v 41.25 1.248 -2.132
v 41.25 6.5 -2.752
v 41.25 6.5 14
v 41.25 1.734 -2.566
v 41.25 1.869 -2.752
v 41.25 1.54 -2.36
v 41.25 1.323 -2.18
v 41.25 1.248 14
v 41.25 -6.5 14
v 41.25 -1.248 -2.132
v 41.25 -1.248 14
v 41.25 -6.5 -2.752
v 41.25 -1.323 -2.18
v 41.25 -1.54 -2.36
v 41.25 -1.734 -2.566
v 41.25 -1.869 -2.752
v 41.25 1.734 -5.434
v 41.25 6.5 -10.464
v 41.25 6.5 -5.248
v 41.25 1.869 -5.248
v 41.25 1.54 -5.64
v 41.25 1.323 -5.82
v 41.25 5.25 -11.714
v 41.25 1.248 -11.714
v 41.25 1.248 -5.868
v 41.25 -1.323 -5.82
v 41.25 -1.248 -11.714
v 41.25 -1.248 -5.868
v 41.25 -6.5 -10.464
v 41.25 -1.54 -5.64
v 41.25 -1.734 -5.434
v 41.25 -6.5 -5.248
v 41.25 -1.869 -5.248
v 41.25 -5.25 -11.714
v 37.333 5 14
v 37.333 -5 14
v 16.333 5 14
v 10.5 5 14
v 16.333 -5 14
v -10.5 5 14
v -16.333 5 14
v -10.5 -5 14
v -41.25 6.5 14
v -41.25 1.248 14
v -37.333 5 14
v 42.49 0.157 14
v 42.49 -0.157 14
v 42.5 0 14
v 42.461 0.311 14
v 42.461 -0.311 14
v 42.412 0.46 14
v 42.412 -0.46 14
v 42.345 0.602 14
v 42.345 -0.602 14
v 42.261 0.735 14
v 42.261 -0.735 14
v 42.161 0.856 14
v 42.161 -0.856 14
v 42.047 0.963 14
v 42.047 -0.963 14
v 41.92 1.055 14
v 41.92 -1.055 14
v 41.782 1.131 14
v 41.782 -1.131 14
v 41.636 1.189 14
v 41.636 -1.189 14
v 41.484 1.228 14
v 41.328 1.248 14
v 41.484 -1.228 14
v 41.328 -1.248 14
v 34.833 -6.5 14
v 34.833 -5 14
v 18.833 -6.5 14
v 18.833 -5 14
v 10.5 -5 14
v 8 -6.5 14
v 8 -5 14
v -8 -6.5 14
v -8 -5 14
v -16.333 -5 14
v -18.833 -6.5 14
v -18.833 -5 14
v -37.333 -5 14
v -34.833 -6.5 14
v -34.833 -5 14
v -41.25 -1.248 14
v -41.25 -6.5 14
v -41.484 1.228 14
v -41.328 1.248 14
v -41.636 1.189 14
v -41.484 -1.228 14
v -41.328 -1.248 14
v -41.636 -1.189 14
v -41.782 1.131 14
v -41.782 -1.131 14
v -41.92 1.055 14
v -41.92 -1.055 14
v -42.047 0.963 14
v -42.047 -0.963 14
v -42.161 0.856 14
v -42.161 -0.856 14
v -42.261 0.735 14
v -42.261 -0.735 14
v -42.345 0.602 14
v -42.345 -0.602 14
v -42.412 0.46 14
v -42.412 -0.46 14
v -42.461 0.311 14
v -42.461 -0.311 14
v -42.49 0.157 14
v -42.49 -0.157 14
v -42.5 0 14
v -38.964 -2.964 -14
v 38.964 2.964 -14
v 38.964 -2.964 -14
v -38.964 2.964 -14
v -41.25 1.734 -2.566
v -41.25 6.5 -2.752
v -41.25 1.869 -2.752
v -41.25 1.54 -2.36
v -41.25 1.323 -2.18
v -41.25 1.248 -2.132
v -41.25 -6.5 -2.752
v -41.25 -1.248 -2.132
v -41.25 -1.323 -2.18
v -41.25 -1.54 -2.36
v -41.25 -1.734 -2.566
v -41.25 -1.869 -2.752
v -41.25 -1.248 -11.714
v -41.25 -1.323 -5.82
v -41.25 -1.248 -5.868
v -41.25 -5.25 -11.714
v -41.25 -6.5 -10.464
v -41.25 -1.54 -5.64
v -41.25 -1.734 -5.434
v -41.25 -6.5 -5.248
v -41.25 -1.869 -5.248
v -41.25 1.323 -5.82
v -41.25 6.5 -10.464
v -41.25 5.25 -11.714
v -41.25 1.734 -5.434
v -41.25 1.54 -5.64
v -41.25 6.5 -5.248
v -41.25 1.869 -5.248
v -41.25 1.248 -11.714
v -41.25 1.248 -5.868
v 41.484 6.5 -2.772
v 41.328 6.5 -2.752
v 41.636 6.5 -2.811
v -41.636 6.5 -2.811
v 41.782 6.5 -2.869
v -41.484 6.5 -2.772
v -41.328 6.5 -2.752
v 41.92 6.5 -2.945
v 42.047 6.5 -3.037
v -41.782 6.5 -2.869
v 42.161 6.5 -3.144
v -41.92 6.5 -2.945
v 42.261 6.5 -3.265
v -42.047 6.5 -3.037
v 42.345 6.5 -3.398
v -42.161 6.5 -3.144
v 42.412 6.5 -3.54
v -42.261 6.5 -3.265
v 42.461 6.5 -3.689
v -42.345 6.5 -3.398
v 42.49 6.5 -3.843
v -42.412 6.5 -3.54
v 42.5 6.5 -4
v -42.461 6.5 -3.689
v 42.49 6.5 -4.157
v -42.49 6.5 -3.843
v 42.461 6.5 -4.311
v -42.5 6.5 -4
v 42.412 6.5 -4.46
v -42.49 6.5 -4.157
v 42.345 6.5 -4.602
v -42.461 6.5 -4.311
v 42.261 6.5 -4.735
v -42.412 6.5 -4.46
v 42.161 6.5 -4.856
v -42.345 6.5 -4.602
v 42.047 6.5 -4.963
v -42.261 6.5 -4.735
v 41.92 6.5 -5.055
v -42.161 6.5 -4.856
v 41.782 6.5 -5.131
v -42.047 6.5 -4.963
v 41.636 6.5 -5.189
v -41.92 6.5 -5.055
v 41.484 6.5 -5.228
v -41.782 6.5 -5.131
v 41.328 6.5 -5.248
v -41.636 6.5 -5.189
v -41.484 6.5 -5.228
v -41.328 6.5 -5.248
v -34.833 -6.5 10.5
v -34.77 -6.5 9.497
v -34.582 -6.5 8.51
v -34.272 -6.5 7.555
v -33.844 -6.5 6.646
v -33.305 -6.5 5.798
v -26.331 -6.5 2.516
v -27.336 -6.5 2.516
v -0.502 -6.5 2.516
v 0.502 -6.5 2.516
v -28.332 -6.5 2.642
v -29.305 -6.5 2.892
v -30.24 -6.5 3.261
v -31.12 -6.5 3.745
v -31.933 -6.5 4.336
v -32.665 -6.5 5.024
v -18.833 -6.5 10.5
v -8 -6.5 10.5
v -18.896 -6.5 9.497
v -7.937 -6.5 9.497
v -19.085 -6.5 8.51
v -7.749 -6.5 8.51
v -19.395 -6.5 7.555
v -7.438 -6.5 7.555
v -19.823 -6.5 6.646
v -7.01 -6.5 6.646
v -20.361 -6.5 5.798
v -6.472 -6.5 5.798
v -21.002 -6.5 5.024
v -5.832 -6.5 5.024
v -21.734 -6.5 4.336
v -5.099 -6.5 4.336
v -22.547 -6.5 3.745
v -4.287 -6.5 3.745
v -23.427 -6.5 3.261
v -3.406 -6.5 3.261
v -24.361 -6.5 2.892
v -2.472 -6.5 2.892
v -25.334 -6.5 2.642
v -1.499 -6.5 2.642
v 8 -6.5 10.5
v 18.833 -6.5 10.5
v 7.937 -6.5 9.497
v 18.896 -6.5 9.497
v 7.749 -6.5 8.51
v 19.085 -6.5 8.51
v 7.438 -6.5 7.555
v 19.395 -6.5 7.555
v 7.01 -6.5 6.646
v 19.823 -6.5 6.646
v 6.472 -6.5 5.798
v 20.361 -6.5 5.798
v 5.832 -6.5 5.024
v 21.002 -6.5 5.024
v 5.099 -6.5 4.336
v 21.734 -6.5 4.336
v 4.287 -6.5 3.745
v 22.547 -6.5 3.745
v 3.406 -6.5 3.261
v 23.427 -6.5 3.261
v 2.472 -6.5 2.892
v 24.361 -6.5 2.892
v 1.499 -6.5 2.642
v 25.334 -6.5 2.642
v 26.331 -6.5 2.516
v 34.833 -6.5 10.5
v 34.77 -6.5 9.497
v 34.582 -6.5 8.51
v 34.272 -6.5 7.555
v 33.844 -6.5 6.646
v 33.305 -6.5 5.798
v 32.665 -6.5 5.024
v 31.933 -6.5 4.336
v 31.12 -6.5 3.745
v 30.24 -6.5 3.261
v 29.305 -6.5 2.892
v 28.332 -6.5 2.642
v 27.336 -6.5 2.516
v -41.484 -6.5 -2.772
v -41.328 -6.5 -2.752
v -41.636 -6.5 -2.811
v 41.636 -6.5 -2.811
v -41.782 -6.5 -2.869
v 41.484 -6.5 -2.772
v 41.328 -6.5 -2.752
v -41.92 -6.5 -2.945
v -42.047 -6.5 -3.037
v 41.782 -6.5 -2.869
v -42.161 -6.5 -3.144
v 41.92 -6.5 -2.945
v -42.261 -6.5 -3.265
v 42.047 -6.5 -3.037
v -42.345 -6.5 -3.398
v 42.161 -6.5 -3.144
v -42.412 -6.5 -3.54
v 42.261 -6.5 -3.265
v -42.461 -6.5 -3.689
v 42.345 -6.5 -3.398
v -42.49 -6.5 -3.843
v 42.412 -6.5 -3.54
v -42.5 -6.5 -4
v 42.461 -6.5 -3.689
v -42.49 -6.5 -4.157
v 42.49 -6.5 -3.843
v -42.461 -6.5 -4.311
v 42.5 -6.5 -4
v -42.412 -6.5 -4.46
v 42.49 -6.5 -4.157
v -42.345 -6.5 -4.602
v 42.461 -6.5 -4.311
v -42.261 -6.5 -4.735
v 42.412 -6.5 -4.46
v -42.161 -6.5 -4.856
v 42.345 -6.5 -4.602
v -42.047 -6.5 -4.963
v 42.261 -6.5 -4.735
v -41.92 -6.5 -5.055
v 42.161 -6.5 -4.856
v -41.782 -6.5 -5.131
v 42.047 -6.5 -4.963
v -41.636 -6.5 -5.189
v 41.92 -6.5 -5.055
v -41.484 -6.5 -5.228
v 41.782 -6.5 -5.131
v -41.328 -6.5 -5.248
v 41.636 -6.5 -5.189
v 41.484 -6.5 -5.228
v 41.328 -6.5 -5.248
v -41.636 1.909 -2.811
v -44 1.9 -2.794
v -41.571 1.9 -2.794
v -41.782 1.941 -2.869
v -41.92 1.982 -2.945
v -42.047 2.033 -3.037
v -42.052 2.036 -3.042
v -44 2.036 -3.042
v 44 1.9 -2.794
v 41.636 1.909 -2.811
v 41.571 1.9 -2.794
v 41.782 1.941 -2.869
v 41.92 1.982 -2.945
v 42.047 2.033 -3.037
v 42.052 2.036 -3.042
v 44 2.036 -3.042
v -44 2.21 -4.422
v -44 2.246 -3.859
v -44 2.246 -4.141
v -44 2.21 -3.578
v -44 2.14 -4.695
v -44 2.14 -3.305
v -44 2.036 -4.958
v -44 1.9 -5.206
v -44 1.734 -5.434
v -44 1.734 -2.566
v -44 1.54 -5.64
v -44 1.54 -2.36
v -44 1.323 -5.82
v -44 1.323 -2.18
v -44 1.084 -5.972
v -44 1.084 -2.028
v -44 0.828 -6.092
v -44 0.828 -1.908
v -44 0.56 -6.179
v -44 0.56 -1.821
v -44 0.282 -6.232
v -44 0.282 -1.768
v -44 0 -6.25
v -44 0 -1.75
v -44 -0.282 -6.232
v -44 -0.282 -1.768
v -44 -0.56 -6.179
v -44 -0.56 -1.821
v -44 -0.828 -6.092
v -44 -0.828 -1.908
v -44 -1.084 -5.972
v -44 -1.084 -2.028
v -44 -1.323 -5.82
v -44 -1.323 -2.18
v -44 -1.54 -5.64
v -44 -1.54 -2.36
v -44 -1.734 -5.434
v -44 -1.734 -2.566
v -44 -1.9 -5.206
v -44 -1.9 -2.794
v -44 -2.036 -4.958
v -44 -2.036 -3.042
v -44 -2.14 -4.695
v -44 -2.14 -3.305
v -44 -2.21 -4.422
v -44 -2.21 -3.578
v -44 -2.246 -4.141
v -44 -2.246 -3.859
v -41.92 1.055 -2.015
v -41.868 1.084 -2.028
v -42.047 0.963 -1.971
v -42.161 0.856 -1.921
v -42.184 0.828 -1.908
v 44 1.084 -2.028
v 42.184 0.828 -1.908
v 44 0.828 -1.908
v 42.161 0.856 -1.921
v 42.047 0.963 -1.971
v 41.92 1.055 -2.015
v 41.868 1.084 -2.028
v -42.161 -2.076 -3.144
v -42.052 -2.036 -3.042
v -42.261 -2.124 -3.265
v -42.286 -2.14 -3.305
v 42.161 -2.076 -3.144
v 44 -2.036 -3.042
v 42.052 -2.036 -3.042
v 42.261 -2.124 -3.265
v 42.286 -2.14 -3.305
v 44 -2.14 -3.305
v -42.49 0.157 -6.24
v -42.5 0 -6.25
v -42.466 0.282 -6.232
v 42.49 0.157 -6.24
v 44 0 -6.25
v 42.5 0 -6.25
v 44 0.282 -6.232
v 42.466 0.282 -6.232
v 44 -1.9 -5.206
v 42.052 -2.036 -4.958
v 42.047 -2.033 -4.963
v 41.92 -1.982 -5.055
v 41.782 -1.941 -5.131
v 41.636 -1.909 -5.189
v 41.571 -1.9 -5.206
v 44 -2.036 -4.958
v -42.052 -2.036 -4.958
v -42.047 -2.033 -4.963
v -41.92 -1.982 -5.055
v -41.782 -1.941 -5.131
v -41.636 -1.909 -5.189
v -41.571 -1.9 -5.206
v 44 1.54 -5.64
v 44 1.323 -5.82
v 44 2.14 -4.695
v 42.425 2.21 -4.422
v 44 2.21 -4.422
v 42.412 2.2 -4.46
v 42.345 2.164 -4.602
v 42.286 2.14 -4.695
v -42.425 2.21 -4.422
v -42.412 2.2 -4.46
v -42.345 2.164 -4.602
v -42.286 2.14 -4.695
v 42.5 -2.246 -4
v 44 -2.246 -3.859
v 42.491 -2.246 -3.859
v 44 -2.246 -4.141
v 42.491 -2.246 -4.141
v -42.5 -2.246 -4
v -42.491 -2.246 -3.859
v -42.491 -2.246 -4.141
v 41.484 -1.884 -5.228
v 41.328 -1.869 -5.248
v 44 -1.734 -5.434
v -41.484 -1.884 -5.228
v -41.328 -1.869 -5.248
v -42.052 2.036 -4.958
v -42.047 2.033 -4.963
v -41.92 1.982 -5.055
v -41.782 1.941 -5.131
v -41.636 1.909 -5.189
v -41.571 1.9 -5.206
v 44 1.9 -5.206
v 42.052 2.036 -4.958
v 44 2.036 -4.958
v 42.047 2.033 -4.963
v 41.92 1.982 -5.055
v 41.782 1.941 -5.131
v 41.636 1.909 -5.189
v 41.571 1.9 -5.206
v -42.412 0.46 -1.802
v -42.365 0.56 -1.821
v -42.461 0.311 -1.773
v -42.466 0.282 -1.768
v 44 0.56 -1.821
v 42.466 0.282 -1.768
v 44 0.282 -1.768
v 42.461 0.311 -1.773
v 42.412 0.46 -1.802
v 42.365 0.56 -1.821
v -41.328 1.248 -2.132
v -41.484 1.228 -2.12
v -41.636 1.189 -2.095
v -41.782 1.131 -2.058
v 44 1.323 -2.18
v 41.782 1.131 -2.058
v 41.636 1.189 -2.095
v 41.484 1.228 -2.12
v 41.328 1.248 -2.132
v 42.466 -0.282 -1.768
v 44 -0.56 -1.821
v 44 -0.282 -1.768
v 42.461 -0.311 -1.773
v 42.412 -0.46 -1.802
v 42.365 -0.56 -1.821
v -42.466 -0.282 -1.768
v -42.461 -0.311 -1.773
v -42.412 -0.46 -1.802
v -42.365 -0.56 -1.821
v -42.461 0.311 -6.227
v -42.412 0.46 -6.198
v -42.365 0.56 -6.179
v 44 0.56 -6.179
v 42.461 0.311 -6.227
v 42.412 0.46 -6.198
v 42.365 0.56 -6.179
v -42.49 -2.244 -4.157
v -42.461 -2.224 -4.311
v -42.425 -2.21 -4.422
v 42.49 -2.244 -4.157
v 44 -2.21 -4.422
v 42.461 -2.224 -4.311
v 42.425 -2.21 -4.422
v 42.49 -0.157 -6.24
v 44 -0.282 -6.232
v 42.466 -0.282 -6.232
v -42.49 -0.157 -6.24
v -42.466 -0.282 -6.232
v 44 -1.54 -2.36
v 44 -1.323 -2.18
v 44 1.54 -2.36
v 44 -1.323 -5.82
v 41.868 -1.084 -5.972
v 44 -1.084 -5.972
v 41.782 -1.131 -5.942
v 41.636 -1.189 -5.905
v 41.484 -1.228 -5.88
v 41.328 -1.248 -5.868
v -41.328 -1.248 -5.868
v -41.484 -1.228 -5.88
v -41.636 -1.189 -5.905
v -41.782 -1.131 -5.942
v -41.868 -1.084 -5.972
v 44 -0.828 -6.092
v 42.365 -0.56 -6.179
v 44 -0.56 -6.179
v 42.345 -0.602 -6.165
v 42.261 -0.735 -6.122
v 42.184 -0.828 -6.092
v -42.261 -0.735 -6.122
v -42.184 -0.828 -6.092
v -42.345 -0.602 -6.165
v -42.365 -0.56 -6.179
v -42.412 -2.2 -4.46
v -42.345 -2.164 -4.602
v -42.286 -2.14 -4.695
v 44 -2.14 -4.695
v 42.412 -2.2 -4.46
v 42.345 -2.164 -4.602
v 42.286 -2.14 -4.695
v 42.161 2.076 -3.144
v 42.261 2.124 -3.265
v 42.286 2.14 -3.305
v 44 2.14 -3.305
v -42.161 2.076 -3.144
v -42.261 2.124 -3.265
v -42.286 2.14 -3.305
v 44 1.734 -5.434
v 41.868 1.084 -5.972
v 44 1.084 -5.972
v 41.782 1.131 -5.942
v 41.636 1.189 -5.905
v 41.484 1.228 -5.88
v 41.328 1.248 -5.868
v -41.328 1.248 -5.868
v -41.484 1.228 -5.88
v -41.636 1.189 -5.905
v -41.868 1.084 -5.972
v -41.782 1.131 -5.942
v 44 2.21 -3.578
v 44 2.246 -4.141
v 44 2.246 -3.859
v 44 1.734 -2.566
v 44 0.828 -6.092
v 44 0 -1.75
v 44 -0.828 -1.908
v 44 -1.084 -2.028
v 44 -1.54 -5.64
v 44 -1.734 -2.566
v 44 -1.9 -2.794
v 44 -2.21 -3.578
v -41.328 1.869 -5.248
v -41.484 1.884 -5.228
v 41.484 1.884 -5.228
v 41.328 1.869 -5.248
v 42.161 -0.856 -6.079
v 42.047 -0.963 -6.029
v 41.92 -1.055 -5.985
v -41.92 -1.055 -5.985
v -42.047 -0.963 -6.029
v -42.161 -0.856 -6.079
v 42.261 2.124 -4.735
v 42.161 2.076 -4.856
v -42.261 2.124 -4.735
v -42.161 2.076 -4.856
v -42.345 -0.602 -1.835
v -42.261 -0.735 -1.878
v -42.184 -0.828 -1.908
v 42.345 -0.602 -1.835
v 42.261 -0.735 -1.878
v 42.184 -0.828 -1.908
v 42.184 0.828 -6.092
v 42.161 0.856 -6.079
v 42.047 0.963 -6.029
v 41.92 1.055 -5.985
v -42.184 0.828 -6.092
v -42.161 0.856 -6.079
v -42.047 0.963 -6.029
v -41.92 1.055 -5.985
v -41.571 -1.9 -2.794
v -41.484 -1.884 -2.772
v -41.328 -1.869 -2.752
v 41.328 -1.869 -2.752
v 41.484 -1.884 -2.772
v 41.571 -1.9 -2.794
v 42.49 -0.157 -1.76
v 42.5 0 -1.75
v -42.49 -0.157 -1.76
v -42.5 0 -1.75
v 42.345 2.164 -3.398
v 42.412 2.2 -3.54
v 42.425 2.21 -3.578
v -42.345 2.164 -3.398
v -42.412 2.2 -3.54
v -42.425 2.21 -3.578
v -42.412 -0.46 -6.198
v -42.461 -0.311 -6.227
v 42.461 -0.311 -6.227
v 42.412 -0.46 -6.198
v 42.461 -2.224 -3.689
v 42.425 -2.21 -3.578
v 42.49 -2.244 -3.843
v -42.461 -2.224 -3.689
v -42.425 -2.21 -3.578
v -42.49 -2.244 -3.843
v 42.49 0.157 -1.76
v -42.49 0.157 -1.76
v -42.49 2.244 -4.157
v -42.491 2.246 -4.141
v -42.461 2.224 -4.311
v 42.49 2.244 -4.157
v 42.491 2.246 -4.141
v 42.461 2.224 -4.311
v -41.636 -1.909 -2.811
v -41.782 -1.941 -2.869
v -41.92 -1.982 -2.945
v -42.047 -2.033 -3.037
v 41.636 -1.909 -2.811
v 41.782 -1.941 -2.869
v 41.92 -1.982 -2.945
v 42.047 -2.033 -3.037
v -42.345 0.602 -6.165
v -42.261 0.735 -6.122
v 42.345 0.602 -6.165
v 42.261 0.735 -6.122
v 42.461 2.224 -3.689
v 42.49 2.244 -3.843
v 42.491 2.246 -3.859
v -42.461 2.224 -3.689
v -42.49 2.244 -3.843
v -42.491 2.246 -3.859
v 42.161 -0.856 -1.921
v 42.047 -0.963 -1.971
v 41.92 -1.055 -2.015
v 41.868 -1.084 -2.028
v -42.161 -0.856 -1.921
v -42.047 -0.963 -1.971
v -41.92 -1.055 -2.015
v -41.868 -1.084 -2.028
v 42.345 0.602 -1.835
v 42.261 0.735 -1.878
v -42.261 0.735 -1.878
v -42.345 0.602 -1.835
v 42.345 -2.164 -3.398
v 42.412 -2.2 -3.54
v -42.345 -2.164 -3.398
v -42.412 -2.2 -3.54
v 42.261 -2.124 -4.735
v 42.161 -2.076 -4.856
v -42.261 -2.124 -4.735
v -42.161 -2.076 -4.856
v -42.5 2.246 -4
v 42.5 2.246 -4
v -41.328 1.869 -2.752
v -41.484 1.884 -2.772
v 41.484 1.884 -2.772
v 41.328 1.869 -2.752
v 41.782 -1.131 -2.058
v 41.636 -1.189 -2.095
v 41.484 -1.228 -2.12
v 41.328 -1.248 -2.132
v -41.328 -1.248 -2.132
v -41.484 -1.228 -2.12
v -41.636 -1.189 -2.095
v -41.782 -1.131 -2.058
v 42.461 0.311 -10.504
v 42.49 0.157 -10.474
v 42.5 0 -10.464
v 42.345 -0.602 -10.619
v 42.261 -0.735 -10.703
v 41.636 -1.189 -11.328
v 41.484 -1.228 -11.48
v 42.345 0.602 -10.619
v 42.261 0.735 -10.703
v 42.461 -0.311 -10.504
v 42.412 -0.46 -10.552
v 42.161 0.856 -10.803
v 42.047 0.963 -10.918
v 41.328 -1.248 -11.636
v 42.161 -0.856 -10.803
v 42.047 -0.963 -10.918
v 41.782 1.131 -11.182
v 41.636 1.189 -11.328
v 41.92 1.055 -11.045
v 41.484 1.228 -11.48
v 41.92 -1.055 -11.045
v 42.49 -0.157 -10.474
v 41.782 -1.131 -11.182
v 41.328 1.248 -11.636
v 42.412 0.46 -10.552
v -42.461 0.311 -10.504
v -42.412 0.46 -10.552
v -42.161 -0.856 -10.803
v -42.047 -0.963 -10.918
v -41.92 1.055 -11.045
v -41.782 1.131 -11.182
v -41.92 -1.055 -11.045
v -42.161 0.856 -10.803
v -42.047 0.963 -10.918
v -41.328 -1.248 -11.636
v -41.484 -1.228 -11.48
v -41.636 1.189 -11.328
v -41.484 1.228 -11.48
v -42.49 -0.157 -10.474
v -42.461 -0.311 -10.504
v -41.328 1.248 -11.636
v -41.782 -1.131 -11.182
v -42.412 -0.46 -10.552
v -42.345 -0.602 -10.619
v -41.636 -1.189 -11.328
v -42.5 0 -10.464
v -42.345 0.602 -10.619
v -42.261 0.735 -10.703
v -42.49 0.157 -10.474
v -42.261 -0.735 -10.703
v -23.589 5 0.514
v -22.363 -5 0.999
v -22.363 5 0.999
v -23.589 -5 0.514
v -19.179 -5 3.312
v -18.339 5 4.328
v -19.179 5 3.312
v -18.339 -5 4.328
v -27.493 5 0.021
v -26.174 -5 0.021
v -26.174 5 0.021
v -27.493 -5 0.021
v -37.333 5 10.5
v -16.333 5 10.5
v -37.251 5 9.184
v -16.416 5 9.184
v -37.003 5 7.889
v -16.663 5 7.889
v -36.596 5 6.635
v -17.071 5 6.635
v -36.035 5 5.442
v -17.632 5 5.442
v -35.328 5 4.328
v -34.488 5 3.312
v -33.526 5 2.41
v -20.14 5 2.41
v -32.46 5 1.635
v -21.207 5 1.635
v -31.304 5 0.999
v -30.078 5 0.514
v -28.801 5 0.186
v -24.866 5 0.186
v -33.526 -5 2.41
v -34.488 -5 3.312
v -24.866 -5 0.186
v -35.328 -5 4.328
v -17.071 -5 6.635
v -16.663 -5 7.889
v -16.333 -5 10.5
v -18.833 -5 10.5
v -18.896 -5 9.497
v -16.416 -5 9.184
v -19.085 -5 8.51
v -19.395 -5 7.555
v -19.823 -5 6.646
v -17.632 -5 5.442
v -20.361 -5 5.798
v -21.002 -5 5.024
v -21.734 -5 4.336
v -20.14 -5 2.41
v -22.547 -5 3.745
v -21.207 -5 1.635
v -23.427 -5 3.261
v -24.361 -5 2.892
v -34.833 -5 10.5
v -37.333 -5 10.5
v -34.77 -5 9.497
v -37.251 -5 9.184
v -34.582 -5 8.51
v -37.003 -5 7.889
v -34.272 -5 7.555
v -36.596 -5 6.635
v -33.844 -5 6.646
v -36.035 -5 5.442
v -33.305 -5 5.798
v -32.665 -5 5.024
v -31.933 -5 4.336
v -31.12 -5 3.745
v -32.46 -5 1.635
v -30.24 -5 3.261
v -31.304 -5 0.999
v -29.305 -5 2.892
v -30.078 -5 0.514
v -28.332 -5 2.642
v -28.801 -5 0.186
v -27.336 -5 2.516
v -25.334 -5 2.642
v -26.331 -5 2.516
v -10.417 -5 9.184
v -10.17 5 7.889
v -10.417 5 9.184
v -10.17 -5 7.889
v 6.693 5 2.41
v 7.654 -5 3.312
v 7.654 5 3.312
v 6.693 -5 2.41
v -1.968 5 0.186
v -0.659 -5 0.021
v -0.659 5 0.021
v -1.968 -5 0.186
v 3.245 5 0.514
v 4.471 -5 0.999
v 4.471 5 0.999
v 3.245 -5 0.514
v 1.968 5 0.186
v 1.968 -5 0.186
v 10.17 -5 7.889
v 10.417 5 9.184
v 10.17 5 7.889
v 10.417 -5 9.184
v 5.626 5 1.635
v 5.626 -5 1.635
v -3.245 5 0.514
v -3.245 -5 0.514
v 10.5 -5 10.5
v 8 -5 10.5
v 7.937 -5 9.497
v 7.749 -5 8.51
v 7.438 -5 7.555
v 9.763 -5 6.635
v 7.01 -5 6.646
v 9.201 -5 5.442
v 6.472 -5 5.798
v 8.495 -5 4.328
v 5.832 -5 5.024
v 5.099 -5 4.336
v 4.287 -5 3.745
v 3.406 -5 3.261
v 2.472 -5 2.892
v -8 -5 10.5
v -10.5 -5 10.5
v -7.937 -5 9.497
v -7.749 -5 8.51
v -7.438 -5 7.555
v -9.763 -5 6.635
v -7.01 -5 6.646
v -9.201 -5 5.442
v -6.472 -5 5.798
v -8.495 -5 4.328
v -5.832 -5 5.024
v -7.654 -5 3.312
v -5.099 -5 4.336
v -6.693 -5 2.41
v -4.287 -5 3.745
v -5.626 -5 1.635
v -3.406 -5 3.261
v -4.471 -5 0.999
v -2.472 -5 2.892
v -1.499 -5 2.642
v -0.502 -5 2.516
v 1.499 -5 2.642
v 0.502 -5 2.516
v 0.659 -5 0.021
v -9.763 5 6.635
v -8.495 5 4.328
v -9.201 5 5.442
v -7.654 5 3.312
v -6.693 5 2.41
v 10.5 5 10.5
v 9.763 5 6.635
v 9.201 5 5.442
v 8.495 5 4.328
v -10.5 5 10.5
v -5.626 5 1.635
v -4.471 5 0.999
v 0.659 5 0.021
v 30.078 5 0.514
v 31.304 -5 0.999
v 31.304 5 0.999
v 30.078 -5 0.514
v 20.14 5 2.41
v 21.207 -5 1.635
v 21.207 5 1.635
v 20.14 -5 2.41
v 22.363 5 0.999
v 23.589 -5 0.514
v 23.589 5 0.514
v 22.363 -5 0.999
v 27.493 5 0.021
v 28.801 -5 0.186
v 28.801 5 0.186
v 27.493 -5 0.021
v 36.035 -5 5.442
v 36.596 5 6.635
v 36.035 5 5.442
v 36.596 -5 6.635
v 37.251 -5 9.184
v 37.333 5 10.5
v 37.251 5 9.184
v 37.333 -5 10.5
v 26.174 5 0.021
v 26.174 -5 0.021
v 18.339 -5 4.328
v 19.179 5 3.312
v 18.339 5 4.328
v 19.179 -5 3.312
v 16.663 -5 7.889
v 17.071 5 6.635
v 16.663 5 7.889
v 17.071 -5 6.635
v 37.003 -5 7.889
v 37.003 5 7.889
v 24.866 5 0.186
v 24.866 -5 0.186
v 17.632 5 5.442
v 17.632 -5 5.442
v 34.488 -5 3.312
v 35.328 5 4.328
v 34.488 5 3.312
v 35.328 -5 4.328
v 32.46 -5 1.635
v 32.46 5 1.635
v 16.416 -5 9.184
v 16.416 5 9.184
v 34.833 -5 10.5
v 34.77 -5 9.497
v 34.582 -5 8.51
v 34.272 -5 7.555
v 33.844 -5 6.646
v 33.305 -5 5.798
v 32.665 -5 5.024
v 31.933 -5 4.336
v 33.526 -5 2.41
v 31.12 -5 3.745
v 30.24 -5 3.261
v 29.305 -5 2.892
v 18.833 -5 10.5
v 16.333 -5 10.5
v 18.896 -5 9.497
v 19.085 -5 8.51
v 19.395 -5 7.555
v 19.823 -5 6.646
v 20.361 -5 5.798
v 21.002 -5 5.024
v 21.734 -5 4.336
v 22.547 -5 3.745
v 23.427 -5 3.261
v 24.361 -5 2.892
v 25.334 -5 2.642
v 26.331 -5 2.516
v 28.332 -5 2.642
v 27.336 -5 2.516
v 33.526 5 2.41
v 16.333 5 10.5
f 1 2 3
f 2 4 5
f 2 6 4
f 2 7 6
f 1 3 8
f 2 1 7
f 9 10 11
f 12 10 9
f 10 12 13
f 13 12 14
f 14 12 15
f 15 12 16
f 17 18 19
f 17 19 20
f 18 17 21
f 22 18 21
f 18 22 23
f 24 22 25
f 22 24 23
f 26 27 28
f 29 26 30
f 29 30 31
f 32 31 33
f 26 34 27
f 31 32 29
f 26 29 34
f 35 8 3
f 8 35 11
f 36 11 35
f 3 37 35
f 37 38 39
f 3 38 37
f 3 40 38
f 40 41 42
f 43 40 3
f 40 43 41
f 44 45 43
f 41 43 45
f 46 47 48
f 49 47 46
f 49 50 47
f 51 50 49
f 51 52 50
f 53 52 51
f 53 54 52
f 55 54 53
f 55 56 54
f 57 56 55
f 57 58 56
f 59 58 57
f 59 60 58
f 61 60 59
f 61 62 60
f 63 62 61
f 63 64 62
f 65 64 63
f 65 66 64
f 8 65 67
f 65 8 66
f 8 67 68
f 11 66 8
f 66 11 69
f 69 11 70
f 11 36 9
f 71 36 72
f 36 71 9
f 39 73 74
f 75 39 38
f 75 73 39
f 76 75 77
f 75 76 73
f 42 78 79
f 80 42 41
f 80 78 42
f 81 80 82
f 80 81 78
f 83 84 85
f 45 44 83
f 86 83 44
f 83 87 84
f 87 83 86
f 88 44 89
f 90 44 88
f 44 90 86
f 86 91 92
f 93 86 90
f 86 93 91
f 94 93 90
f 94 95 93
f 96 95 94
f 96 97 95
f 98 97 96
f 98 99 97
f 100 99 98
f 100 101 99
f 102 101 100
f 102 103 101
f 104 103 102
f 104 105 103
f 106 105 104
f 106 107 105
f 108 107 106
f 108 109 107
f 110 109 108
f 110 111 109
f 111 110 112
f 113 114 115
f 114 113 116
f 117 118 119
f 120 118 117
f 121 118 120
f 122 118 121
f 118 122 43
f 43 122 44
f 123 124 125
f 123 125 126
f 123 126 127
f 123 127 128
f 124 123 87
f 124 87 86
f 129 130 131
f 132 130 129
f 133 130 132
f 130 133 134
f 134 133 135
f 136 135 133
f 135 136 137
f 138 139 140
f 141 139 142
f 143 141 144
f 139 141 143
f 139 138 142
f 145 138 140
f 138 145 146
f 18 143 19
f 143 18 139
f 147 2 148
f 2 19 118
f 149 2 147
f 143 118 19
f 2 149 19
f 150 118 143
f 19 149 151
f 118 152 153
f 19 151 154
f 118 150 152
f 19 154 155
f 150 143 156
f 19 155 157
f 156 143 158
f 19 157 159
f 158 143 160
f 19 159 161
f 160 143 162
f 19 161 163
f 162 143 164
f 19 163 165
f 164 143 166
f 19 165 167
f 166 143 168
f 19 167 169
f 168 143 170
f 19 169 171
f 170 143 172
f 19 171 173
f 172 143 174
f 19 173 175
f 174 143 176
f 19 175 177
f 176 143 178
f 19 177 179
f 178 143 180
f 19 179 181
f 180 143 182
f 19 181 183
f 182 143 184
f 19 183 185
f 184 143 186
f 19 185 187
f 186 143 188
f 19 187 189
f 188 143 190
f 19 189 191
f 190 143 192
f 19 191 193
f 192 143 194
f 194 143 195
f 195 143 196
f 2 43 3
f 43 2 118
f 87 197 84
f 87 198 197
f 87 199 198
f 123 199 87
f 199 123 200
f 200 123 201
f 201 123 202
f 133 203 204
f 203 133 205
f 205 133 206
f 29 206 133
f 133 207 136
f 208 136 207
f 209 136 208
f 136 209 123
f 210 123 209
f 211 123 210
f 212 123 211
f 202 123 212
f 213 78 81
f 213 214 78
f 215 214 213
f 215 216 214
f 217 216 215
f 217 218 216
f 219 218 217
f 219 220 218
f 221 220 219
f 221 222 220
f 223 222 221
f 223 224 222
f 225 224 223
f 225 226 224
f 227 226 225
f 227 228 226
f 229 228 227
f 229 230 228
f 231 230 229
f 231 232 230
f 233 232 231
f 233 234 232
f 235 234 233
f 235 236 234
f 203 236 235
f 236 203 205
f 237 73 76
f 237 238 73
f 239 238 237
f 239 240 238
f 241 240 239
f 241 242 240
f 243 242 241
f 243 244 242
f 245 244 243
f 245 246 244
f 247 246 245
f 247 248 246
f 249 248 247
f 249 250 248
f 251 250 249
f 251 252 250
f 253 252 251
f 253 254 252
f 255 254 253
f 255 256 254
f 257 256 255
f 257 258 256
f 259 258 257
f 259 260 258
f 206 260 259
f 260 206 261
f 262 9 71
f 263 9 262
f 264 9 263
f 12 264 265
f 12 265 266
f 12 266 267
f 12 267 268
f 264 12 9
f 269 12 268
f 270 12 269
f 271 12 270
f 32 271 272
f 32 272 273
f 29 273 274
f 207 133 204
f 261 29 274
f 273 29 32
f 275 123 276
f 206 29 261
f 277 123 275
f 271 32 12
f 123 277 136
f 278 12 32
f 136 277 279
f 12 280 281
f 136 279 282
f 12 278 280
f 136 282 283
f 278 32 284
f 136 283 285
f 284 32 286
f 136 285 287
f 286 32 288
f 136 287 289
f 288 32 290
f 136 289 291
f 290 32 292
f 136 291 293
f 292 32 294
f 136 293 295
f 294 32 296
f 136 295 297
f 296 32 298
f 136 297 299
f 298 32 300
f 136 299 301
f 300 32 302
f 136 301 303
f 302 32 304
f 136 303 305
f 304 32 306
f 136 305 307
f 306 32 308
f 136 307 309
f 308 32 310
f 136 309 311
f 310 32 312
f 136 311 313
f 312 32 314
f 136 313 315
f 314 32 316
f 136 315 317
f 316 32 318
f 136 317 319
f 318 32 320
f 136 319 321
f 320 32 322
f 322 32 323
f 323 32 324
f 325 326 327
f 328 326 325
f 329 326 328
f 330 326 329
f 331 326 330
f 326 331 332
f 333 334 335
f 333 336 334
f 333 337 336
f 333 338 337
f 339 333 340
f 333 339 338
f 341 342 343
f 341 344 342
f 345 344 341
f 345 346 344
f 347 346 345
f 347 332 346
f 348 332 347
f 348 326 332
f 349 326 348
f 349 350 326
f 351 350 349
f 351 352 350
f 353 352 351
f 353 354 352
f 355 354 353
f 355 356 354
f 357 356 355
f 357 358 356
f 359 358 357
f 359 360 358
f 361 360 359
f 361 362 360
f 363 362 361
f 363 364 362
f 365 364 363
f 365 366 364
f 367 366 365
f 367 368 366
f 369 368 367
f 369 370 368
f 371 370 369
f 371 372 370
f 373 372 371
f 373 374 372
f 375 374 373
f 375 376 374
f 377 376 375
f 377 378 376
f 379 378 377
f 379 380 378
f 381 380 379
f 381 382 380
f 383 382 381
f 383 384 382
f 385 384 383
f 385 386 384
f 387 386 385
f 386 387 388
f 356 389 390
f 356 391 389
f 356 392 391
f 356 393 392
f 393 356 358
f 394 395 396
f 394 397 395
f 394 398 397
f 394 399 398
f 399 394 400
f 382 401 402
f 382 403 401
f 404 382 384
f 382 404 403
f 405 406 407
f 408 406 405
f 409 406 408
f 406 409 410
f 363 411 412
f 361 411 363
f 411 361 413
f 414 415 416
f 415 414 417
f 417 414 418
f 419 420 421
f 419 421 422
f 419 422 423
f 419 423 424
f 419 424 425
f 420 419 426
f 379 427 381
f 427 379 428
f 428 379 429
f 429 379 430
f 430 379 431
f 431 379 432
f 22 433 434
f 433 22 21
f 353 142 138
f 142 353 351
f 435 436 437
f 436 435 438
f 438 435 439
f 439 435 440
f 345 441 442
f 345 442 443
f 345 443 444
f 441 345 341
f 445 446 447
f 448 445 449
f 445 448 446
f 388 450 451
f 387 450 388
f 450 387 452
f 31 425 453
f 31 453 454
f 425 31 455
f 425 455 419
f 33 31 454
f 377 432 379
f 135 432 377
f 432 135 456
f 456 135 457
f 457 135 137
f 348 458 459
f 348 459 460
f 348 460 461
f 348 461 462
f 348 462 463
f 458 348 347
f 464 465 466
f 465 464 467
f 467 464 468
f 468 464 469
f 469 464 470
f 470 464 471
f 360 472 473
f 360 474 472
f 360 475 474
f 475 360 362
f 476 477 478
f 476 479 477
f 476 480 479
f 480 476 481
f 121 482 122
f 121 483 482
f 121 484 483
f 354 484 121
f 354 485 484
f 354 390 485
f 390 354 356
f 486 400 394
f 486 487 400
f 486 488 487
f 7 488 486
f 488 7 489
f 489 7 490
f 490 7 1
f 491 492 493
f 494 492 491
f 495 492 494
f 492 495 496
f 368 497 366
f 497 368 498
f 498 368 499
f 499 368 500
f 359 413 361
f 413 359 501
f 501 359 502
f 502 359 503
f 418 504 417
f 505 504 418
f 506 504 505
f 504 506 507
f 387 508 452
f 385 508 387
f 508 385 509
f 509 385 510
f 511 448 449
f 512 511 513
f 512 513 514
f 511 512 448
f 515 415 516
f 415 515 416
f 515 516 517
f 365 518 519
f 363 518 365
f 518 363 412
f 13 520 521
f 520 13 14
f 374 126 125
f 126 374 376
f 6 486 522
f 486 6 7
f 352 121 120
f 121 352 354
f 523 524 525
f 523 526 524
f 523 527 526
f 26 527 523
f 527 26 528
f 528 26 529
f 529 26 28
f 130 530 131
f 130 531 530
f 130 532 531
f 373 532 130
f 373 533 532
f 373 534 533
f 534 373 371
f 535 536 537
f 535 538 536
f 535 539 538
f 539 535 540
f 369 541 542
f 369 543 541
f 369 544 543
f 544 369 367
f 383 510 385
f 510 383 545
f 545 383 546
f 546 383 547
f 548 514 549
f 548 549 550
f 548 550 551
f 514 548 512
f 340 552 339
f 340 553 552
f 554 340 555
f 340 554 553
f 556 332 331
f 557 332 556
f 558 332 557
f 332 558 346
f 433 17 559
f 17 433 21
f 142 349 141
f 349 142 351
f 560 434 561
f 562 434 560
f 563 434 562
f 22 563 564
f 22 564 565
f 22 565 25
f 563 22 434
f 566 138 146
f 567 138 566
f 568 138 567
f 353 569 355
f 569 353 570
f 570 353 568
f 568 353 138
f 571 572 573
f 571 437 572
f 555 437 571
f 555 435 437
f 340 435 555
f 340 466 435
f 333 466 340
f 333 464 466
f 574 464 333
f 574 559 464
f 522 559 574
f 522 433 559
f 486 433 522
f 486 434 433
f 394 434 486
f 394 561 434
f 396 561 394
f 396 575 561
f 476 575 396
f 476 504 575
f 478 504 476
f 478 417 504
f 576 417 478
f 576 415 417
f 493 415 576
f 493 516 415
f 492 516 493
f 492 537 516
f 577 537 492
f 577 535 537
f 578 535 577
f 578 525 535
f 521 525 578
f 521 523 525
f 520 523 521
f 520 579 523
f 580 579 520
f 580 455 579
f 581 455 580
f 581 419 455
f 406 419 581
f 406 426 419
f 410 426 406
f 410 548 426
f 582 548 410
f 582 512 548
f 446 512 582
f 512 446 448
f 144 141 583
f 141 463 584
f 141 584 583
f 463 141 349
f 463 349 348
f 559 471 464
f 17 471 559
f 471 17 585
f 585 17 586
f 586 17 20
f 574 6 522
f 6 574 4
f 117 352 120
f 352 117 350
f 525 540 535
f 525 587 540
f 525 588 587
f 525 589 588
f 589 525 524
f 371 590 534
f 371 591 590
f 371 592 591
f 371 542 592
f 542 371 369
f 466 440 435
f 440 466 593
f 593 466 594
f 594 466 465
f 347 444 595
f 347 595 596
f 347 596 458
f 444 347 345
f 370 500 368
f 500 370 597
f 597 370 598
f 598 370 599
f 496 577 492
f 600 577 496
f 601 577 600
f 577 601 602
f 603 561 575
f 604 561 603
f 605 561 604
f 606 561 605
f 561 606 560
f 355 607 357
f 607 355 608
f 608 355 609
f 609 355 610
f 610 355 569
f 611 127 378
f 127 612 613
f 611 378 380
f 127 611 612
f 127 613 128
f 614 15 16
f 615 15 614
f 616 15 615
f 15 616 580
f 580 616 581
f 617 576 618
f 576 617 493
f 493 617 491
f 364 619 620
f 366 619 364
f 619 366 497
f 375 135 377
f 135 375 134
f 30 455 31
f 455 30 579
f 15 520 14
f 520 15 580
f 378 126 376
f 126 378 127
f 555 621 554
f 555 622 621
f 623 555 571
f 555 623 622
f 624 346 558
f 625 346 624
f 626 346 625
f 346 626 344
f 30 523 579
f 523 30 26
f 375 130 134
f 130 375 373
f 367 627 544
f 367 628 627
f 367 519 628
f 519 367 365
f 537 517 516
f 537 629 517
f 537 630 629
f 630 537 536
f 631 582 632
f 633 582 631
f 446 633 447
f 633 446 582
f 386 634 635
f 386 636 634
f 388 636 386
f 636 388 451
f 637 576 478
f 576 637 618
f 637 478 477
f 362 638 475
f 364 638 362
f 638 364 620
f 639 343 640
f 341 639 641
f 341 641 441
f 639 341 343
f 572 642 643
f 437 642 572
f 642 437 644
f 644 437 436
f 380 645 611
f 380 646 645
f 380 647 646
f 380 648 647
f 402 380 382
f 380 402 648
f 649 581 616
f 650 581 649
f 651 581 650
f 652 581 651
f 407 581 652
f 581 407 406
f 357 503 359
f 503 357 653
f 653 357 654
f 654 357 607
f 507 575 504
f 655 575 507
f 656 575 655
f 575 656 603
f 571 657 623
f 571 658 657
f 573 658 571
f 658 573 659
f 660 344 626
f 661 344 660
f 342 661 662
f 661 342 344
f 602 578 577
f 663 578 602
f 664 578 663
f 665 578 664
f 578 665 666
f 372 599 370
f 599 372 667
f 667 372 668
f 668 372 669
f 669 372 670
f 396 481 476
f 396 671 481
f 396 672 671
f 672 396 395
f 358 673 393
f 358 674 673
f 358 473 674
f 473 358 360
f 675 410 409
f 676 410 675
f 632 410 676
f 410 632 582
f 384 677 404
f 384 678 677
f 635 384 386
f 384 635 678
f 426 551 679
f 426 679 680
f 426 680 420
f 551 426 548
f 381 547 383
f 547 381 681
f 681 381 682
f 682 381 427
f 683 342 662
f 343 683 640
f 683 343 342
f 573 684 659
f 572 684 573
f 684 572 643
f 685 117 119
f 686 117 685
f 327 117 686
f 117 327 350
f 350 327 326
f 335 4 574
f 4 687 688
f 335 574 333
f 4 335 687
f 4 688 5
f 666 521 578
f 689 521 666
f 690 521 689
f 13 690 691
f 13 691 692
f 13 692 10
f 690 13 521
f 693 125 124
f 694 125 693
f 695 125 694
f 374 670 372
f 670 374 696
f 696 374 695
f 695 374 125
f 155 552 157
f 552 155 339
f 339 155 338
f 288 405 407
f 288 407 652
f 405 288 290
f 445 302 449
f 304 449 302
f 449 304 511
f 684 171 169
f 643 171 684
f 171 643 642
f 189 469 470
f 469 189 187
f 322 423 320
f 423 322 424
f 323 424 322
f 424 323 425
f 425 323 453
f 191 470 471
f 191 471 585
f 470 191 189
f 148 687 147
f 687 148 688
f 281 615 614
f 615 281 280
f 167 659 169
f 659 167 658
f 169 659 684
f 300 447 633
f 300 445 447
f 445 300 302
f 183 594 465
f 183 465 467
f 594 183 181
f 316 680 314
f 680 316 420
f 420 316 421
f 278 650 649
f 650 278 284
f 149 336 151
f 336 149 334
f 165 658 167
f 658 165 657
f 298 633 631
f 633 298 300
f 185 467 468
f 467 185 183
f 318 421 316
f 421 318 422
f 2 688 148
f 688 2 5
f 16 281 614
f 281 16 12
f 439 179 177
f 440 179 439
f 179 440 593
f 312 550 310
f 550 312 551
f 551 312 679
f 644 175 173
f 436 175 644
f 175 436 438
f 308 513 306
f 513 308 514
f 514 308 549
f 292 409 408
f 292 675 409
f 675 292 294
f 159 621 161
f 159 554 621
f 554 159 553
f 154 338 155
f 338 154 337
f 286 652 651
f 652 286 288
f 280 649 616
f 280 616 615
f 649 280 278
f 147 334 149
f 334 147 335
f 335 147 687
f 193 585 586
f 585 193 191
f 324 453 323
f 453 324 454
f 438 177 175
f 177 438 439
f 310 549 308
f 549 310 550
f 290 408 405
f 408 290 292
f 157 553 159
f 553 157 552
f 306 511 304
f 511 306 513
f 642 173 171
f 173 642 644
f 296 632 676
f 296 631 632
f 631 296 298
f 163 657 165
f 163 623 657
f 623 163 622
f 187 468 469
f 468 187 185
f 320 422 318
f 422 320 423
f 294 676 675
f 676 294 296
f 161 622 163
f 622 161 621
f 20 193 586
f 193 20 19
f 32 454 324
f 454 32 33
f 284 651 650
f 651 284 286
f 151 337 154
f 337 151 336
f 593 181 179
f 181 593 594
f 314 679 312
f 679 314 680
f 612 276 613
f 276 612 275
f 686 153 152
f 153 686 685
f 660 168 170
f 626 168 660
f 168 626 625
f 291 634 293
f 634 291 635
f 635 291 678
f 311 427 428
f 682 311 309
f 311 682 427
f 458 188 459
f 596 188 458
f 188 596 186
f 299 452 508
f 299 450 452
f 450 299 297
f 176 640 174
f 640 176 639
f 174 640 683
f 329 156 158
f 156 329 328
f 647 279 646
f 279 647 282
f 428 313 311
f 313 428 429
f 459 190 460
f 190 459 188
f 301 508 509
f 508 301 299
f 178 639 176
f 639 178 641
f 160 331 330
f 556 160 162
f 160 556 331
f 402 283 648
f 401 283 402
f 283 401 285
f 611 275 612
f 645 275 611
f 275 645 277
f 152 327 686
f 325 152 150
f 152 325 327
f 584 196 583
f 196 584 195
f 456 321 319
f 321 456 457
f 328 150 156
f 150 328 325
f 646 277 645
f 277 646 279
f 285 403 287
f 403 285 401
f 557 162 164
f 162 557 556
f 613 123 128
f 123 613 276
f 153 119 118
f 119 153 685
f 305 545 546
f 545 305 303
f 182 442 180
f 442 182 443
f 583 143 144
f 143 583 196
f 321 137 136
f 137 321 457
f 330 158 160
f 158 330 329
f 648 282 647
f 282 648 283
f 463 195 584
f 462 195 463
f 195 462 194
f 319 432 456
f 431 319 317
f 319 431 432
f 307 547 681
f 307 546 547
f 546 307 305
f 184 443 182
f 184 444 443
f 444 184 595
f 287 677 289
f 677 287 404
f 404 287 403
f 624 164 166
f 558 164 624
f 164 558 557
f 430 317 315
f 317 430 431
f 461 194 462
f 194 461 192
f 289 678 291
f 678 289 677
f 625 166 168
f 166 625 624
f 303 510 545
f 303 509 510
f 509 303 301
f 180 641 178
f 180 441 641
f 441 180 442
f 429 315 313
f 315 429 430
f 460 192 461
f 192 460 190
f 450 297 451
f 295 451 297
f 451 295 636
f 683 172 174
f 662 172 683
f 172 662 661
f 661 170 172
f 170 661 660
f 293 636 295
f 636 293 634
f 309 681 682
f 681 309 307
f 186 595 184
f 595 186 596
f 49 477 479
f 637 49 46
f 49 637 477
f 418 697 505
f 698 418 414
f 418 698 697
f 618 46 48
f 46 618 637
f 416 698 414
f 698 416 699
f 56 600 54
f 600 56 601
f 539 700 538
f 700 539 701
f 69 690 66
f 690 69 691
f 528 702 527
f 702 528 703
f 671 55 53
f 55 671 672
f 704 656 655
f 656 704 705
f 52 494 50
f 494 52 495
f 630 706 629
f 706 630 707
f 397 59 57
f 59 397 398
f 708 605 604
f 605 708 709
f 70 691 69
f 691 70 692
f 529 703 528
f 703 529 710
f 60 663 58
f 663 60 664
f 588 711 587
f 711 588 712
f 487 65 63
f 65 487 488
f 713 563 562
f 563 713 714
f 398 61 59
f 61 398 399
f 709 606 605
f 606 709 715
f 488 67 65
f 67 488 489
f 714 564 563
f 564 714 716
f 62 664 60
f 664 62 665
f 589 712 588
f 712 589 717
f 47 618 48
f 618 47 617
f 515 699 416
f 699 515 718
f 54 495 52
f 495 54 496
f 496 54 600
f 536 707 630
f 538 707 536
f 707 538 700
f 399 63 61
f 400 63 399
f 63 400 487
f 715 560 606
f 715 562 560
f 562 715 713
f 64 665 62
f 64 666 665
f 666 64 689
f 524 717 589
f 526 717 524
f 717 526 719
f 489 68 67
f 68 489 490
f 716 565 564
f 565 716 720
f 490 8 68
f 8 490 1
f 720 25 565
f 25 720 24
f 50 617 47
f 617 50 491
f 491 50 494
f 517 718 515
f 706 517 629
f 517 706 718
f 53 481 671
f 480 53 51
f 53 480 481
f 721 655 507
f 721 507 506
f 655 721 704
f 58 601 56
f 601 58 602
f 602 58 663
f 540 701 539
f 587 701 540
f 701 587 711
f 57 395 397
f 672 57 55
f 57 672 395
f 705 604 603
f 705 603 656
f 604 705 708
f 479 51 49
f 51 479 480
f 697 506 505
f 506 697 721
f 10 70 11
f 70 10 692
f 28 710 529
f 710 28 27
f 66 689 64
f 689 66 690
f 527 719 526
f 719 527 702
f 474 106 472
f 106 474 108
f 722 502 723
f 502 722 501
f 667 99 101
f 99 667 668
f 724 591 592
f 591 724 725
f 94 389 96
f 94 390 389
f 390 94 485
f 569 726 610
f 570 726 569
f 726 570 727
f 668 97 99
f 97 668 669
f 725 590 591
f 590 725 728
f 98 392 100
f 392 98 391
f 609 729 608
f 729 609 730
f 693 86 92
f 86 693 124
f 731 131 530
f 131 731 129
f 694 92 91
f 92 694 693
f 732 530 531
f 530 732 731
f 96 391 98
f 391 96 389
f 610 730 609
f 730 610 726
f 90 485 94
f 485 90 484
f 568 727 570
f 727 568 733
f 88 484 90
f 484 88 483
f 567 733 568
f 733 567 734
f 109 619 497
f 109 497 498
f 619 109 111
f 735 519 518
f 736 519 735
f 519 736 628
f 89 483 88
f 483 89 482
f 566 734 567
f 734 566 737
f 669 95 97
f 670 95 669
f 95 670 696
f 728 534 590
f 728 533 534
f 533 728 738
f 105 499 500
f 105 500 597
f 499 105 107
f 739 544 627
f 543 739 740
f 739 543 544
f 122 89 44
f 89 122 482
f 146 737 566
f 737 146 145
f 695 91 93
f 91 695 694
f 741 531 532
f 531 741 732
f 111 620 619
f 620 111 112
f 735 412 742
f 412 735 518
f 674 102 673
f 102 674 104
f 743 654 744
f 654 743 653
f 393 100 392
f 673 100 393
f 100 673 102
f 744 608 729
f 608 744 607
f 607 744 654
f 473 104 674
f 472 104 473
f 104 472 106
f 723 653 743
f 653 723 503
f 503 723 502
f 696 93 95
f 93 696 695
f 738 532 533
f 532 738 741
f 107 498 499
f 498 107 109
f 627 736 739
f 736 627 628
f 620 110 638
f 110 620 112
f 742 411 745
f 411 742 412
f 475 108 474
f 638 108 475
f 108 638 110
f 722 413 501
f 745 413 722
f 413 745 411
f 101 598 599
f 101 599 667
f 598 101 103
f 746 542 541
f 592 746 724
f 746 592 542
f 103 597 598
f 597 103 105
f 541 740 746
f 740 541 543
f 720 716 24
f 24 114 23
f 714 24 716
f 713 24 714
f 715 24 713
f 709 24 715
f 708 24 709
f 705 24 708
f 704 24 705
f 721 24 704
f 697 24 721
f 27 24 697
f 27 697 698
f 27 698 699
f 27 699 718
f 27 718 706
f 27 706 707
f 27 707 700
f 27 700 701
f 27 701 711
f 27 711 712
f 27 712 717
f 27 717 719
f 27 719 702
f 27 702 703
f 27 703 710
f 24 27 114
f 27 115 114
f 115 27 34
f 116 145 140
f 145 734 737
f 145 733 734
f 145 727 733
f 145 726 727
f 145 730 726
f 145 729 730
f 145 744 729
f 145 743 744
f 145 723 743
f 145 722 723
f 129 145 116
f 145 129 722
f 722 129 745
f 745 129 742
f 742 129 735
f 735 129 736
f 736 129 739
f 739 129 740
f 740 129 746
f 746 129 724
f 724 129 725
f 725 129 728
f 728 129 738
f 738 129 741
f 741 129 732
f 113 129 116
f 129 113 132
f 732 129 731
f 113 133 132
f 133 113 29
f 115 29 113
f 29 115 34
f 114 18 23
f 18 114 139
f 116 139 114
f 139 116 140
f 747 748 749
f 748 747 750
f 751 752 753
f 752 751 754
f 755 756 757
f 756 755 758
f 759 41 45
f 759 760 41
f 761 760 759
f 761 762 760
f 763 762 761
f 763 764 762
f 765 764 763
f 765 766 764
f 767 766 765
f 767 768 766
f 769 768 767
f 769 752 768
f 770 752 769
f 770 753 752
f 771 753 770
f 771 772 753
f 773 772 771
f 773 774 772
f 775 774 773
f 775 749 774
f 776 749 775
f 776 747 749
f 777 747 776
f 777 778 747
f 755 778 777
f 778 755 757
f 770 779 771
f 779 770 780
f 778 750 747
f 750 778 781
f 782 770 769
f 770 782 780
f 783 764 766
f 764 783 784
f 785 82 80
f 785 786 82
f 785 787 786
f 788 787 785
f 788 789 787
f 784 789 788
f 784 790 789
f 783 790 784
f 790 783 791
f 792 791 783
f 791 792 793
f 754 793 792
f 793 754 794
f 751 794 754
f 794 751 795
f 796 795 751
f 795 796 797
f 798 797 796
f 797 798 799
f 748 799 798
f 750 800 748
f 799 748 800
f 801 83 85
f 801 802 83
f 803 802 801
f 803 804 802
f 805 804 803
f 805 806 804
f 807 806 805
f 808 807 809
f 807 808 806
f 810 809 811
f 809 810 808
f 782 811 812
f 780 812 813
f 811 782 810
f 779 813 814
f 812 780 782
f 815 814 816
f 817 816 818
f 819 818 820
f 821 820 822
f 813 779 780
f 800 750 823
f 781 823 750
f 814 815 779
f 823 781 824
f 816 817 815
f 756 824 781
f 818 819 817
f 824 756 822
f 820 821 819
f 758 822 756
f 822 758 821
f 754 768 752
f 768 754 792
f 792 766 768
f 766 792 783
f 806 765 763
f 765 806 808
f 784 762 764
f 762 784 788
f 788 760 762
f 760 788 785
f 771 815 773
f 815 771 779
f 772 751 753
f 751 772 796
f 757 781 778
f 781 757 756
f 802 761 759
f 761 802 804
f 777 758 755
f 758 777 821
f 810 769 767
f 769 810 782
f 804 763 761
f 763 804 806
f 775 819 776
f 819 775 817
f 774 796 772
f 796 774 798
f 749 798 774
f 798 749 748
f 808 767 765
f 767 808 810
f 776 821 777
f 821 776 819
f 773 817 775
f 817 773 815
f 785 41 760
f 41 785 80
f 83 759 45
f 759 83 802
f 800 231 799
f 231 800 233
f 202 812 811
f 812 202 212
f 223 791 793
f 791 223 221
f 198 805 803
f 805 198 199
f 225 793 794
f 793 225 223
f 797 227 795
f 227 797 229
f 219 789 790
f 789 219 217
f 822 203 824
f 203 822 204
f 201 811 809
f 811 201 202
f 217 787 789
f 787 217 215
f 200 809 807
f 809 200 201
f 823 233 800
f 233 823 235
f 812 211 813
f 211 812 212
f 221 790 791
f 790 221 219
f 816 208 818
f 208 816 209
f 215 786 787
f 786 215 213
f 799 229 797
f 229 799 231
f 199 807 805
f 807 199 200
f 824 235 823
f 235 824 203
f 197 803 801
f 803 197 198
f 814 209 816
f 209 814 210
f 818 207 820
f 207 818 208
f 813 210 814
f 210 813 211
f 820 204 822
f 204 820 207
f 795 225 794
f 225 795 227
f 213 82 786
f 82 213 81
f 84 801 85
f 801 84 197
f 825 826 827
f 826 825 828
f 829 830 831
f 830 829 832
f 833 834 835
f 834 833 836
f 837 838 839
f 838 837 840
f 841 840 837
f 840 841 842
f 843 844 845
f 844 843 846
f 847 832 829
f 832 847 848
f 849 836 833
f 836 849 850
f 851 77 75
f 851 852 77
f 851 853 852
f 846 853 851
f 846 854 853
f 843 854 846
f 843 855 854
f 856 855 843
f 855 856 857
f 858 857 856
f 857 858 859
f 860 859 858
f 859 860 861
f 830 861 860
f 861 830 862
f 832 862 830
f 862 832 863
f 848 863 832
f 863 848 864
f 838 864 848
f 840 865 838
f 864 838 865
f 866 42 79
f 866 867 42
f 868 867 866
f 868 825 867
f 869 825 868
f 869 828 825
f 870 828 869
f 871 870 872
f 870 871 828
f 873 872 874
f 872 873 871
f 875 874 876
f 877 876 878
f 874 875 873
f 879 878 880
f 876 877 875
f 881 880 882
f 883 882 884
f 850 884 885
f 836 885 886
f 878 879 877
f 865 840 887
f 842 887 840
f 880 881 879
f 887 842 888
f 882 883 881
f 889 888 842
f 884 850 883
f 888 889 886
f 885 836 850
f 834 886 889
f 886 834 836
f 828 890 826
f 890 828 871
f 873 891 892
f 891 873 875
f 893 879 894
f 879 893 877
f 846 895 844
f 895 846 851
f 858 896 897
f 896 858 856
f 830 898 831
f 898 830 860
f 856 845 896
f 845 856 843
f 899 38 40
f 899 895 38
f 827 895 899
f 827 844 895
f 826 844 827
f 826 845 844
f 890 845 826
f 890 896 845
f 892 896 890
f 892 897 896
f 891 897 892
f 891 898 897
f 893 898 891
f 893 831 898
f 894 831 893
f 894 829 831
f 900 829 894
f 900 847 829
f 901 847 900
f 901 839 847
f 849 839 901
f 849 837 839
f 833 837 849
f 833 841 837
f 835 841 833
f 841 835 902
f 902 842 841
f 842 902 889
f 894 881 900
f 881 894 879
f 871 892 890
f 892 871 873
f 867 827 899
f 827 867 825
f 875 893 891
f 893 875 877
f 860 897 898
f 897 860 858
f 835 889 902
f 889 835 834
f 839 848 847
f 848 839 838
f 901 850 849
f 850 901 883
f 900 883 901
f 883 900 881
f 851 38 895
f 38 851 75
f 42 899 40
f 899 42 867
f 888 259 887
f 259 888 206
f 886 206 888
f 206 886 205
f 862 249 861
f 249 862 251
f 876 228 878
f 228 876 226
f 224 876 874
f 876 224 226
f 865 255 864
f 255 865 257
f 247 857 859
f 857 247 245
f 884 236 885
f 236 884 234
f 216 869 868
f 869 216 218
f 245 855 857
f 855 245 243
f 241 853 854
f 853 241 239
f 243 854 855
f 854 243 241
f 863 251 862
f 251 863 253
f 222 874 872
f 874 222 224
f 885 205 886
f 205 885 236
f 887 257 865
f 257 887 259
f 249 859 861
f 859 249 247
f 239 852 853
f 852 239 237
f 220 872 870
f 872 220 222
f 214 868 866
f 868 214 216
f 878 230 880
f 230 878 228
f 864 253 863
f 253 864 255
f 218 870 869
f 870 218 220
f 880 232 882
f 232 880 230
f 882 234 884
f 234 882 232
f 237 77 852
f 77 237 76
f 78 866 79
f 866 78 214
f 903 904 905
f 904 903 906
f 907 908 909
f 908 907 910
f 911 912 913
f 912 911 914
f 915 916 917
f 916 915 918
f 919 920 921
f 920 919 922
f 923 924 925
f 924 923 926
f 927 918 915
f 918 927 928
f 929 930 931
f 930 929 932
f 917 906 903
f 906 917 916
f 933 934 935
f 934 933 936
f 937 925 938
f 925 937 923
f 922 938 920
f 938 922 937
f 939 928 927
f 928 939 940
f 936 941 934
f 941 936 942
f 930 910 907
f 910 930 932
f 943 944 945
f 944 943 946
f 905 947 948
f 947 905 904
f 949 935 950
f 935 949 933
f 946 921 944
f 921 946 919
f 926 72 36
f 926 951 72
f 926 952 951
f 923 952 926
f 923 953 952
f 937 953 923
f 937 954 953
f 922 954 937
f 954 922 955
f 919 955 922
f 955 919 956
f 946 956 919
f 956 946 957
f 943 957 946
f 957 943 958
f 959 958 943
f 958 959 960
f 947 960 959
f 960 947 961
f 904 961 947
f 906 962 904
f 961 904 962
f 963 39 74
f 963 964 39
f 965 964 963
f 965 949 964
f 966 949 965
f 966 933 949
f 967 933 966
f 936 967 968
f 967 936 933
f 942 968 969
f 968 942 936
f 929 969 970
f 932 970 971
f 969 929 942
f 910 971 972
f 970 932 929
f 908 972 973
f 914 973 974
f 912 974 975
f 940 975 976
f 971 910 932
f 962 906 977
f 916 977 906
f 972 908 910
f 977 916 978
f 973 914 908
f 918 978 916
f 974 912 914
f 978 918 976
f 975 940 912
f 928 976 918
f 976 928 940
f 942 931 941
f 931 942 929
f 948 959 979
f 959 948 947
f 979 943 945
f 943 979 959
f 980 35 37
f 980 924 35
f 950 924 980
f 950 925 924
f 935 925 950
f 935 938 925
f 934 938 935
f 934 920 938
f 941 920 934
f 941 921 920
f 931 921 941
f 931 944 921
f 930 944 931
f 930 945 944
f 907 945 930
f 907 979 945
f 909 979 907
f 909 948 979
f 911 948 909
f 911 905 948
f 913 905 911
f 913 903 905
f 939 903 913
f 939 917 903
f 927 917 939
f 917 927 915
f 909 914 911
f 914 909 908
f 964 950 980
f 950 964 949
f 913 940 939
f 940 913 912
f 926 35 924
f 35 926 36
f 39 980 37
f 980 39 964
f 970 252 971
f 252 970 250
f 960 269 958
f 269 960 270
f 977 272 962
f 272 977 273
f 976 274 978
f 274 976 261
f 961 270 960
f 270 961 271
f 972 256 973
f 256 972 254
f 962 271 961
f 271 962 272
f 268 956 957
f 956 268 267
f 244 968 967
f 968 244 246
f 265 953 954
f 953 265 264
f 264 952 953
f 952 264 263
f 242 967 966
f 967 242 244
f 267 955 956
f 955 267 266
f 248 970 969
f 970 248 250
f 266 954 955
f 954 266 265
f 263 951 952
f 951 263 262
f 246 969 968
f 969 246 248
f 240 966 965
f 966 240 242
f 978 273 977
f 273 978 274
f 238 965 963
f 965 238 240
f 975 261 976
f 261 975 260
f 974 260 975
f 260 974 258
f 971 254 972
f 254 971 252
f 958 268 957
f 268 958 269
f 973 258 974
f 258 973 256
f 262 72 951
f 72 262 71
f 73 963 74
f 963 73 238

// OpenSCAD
/************** BEST VIEWED IN A CODE EDITOR 80 COLUMNS WIDE *******************
*
* Milwaukee Dremel disc Holders
* Benjamen Johnson <workshop.electronsmith.com>
* 20190913
* Version 3
* openSCAD Version: 2015.03-2
*******************************************************************************/
/*[Global]*/

// Diameter of the disc (25 small, 33 large)
disc_dia = 21; 

// number of slots
num_slots = 3;

// width of the disc slot (front to back)
disc_slot_width = 10;

/*[Holder Parameters]*/
/*******************************************************************************
*    /\ /\ /\ /\ /\ /\ /\ /\ /\ /\  < ---- bits
*   -------------------------------  --
*  |                               |  body_height 
*  |                               |
*   -------------------------------  --
*  |< ------- body_width --------->|
*   -------------------------------  --
*  | X  X  X  X  X  X  X  X  X  X  |  body_depth
*   -------------------------------  --
*
*  || <- min_edge
*   -----------
*  | --- | --- | --
*  ||   |||   ||  slot_width
*  | --- | --- | --
*   -----------
*         |   | <- slot_length (I know these seem backward in 2D)
*  
*******************************************************************************/
// width of the holder body
body_width = 82.5 ; // 82.5

// depth of holder 
body_depth = disc_slot_width+2*1.5; // 11

// height of holder
body_height = 28;

// length of slot (side to side)
slot_length = disc_dia;

// width of the bit slot (front to back)
slot_width = disc_slot_width;

// how much material to leave at the bottom of the bit slots
bottom_thickness = 2;

// how much to chamfer the ends
bottom_chamfer = 5;

//width of the finger slot
finger_width = 16;

// minimum wall thickness at the edge of the holder
min_edge = 1;

/*[Connector Parameters]*/
/*******************************************************************************
*     -------------------------------
*   -| X  X  X  X  X  X  X  X  X  X  |-
*     -------------------------------
*  | <------ total_pin_length -------->|
*
*             -------
*        --  |---O---|  o <- pin_dia (diamter of pivot pin)
* pin_height |   |   | 
*            |   |   |    <- catch_dia (diameter of the semicircular catches)
*        --   -------
******************************************************************************/
// Length of cylinder passing through the holder that it rotates on 
total_pin_length = 88; // 88

// diameter of the above cylinder
pin_dia = 4.5; // 4.5

// diameter of the semicircular catches
catch_dia = 2.5;

// pin distance from the bottom of holder;
pin_height = 10; 

/*[Expert]*/
// add a slight offset to cuts to make model render properly
render_offset = 0.01; //0.005

difference(){

    // make the basic holder
    MilwaukeeHolder();

    //calculations for positioning the slots
    width2= body_width - 2 * min_edge;
    step = width2 /(num_slots);
    start = -width2/2+step/2;
    end = width2/2;
    bottom_pos = bottom_thickness+ (33 - disc_dia);
    
    for (x=[start:step:end]){
        // cut the slots for the discs
        translate([x,0,-(body_height-disc_dia)/2+bottom_pos])rotate([90,0,0])cylinder(h=slot_width, d=disc_dia, center=true, $fn=50);
        translate([x,0,disc_dia/2+bottom_pos])cube([disc_dia,slot_width,body_height],center=true);
        
        // cut the finger holes
        translate([x,-4,-(body_height-disc_dia)/2+bottom_pos])rotate([90,0,0])cylinder(h=slot_width, d=finger_width, center=true, $fn=50);
        translate([x,-4,disc_dia/2+bottom_pos])cube([finger_width,slot_width,body_height],center=true);
        }//end for

}//end difference

module MilwaukeeHolder(){
    
    // calculate where to put the pin
    pin_pos = - body_height/2+pin_height;

    difference(){
        union(){
            // Form the main body
            cube([body_width,body_depth,body_height],center = true);
                    
            // form the pivot pins
            translate([0,0,pin_pos])rotate([0,90,0])cylinder(d=pin_dia,h=total_pin_length,center=true,$fn=50);
            
            //form the horizontal catches
            translate([body_width/2,0,pin_pos])rotate([90,0,0])cylinder(d=catch_dia,h=body_depth,center=true,$fn=50);
            translate([-body_width/2,0,pin_pos])rotate([90,0,0])cylinder(d=catch_dia,h=body_depth,center=true,$fn=50);
            
            //form the vertical catches
            translate([body_width/2,0,0])rotate([0,0,0])cylinder(d=catch_dia,h=body_height,center=true,$fn=50);
            translate([-body_width/2,0,0])rotate([0,0,0])cylinder(d=catch_dia,h=body_height,center=true,$fn=50);
        } // end union
        
        //cut off bottom corners
        translate([(body_width+catch_dia)/2,0,-body_height/2])rotate([0,45,0])cube([bottom_chamfer,body_depth+render_offset,bottom_chamfer],center=true);
        translate([-(body_width+catch_dia)/2,0,-body_height/2])rotate([0,45,0])cube([bottom_chamfer,body_depth+render_offset,bottom_chamfer],center=true);
        translate([0,-body_depth/2,-body_height/2])rotate([45,0,0])cube([body_width+render_offset, bottom_chamfer ,bottom_chamfer],center=true);
        translate([0,body_depth/2,-body_height/2])rotate([45,0,0])cube([body_width+render_offset, bottom_chamfer ,bottom_chamfer],center=true);     
    
    }//end difference
} // end module
